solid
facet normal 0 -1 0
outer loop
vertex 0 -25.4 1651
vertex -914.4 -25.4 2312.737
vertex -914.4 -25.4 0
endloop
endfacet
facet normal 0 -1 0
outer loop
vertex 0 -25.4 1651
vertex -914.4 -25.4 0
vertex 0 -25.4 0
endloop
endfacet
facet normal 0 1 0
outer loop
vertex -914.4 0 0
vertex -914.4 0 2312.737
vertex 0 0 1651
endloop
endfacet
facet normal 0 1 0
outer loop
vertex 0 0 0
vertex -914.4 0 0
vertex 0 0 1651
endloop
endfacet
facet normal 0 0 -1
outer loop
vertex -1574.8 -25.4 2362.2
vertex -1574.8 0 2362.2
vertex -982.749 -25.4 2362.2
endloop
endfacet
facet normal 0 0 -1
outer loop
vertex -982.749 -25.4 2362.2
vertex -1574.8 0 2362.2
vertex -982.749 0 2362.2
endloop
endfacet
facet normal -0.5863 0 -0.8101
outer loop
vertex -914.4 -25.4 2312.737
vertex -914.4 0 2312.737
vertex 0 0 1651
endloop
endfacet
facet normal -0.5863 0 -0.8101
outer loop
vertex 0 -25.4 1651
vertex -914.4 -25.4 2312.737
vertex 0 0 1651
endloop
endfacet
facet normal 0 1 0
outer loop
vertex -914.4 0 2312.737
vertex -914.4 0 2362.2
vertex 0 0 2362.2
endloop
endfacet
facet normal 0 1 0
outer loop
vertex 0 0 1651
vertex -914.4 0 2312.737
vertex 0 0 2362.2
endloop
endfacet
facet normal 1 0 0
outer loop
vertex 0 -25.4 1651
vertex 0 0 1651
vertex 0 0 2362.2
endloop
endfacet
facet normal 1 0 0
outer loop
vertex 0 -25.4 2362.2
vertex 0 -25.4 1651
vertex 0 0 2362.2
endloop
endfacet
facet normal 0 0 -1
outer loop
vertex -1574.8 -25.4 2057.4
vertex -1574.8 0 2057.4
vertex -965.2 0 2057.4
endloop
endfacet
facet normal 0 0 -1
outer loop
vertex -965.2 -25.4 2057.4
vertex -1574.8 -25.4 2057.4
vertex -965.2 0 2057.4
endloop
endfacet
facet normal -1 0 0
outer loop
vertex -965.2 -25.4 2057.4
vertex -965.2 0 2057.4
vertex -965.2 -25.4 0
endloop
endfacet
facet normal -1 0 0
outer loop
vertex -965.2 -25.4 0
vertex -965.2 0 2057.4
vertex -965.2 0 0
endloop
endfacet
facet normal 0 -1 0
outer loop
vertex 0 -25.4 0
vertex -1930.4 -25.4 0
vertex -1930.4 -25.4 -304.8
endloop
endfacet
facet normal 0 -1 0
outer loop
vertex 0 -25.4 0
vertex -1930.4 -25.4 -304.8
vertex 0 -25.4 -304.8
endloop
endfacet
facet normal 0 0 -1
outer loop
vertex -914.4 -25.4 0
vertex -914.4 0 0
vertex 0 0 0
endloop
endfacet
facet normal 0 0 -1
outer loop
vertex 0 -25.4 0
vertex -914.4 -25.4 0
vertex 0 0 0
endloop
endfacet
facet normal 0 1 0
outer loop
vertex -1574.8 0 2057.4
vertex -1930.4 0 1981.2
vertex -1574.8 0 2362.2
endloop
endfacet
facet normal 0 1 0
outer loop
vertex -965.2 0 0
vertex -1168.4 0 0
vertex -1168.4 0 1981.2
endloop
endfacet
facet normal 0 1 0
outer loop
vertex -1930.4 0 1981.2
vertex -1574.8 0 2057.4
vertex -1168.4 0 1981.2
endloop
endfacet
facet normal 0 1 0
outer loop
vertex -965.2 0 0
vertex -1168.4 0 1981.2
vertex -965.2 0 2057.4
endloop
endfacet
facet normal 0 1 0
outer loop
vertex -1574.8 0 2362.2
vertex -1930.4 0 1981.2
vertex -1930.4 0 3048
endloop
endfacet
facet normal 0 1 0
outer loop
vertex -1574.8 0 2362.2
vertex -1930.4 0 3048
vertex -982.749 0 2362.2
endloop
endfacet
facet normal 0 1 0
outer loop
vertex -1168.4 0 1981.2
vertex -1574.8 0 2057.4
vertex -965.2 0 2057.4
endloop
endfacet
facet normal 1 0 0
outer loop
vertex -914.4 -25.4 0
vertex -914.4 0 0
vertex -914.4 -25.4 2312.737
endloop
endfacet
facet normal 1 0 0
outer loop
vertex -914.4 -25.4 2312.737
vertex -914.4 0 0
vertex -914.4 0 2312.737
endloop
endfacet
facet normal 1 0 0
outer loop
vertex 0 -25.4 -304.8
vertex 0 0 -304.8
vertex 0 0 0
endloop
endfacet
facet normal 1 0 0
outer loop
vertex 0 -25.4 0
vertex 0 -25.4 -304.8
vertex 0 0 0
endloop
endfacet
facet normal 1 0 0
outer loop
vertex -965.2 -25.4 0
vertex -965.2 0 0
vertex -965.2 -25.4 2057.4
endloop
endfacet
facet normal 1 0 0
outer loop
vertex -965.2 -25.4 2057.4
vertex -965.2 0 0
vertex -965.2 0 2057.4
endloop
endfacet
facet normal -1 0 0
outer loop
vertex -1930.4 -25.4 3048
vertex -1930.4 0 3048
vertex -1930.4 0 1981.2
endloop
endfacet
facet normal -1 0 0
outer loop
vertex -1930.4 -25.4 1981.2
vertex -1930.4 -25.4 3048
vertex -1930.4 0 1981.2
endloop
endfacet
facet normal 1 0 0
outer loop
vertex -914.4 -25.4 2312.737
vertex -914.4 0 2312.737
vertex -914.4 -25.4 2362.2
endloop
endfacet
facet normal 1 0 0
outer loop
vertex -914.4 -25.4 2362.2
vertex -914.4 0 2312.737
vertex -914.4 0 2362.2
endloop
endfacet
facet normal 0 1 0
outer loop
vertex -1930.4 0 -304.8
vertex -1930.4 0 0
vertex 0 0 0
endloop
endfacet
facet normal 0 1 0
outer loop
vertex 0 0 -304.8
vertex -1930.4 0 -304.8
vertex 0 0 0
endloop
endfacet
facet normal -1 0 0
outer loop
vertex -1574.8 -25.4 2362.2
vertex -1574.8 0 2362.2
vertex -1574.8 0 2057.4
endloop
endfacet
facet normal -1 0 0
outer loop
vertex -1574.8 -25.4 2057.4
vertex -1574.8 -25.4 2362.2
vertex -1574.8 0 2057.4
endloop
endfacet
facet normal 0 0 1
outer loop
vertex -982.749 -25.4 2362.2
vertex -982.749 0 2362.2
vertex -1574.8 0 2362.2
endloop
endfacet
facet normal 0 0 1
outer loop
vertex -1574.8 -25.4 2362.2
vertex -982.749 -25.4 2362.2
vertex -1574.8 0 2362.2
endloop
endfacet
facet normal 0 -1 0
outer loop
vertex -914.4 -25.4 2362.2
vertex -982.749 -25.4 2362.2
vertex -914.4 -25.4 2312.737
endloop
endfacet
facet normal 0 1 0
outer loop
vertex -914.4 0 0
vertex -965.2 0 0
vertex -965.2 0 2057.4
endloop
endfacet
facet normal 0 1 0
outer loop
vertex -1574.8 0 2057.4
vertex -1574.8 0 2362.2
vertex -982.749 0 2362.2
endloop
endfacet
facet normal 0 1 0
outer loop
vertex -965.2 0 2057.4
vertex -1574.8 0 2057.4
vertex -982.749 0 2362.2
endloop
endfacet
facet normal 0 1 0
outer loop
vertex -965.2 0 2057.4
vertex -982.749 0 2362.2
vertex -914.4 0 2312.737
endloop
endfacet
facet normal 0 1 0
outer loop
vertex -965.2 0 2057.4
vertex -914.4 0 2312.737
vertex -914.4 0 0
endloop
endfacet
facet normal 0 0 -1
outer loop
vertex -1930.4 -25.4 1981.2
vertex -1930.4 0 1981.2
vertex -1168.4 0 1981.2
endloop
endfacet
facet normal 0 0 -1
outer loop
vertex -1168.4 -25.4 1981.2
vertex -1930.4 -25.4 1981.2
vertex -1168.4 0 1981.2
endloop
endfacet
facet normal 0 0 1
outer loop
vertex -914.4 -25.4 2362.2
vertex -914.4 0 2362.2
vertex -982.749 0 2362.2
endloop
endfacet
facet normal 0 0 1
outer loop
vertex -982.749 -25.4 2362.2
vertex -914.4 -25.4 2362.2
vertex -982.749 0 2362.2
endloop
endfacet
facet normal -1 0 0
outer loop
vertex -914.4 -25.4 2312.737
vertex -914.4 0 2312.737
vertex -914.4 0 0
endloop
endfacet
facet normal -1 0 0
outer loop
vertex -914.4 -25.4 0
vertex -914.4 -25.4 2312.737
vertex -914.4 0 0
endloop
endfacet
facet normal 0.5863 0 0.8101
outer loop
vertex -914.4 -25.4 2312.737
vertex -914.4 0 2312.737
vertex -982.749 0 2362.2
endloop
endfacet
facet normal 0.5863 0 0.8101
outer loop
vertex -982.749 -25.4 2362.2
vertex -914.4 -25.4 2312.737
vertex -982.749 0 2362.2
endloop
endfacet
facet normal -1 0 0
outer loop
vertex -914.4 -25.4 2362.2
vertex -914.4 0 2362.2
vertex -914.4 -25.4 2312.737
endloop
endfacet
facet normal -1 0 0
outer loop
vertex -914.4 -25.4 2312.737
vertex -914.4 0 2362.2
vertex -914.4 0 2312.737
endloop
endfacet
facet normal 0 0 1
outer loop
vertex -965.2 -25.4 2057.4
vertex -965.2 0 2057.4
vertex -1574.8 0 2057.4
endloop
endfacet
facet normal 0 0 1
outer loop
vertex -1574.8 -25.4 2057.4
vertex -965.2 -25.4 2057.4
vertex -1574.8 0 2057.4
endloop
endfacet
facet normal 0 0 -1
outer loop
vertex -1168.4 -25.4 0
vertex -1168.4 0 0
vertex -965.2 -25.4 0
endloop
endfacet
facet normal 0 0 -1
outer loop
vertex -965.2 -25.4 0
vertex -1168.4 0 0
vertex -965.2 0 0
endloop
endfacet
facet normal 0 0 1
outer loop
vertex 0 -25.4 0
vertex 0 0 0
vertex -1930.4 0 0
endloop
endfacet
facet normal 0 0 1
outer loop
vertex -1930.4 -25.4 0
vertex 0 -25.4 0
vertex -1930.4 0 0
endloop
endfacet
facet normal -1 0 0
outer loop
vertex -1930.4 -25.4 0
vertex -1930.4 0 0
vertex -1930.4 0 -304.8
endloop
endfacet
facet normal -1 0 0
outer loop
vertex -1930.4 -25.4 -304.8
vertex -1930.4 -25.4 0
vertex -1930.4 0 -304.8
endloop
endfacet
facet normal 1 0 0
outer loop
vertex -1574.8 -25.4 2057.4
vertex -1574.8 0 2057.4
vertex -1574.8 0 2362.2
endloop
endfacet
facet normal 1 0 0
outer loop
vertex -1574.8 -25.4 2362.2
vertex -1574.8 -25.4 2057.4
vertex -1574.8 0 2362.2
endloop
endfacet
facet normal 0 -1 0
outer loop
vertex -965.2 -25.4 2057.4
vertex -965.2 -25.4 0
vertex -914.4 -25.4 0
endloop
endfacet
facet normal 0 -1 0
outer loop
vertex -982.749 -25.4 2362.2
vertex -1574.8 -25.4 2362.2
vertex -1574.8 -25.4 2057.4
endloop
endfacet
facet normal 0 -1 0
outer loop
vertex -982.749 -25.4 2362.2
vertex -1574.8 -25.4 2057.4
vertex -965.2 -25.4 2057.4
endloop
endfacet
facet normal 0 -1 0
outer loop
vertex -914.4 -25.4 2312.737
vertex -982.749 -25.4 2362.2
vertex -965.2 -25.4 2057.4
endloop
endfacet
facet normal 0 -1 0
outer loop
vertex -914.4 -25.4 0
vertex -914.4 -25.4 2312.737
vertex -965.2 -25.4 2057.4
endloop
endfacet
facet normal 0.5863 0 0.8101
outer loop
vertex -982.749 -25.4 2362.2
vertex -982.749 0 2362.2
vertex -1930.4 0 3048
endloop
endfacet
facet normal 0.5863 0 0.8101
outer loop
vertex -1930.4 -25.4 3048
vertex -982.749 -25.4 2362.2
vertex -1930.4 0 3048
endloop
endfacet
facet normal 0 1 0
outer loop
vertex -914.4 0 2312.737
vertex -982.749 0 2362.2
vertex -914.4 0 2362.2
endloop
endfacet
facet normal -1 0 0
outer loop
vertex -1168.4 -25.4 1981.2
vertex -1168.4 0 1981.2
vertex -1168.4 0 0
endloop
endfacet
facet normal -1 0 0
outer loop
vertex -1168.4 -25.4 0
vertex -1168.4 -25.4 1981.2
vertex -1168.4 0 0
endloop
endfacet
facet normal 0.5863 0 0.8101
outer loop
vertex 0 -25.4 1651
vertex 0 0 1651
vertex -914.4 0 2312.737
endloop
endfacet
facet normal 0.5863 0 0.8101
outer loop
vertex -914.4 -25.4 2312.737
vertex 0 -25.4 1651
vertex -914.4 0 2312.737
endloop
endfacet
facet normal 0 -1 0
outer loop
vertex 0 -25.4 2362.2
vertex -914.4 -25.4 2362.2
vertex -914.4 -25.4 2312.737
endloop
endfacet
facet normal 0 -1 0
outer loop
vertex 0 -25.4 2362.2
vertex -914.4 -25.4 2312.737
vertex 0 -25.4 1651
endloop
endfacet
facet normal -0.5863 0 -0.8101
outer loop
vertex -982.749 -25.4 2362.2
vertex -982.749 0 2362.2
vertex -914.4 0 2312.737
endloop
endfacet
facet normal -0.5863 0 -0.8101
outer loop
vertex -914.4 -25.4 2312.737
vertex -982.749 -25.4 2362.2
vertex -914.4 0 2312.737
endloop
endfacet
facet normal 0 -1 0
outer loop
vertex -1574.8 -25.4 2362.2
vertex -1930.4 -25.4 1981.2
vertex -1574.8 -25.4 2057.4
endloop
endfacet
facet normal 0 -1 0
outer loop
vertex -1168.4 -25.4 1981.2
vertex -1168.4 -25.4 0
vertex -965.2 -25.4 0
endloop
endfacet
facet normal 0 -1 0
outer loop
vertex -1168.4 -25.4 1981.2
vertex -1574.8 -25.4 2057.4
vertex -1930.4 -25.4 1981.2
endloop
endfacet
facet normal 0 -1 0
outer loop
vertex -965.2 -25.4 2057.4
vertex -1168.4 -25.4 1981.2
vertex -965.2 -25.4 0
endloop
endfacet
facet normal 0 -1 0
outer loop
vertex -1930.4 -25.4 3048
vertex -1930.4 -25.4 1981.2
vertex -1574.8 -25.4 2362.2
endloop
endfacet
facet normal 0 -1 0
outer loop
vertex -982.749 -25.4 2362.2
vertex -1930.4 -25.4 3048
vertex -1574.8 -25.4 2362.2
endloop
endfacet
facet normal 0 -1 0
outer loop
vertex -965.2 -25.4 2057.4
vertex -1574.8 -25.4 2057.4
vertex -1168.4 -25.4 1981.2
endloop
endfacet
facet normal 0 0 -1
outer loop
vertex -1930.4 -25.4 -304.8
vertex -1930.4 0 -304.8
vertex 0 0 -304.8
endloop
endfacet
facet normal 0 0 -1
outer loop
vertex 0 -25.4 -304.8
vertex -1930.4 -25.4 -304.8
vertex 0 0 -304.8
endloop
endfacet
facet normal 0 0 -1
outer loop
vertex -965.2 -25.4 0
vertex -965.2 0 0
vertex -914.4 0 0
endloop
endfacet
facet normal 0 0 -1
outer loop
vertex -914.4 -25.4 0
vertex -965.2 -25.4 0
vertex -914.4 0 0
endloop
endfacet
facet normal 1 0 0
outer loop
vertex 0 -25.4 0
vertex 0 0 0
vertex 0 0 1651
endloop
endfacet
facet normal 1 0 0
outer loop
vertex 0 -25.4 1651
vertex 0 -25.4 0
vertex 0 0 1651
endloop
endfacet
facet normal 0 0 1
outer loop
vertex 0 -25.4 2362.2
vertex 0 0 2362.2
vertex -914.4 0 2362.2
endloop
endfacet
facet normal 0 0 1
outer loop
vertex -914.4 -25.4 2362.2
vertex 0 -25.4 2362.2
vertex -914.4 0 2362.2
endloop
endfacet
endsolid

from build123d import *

# Parameters (mm, degrees)
F1_DEPTH = 25.4
F2_DEPTH = 25.4
F3_DEPTH = 25.4


with BuildPart() as f1:
    # F0 (on Front) → F1 (new body)
    with BuildSketch(Plane.XZ):
        Polygon((-965.2, 0), (-914.4, 0), (-914.4, 2312.736842), (-982.749091, 2362.2), (-1574.8, 2362.2), (-1574.8, 2057.4), (-965.2, 2057.4), align=None)
        Polygon((-914.4, 2362.2), (-914.4, 2312.736842), (0, 1651), (0, 2362.2), align=None)
    extrude(amount=F1_DEPTH)


with BuildPart() as f2:
    # F0 (on Front) → F2 (new body)
    with BuildSketch(Plane.XZ):
        Polygon((-1168.4, 0), (-965.2, 0), (-965.2, 2057.4), (-1574.8, 2057.4), (-1574.8, 2362.2), (-982.749091, 2362.2), (-1930.4, 3048), (-1930.4, 1981.2), (-1168.4, 1981.2), align=None)
        Polygon((-982.749091, 2362.2), (-914.4, 2312.736842), (-914.4, 2362.2), align=None)
        Polygon((-914.4, 2312.736842), (-914.4, 0), (0, 0), (0, 1651), align=None)
    extrude(amount=F2_DEPTH)


with BuildPart() as f3:
    # F0 (on Front) → F3 (new body)
    with BuildSketch(Plane.XZ):
        Polygon((0, 0), (-914.4, 0), (-965.2, 0), (-1168.4, 0), (-1930.4, 0), (-1930.4, -304.8), (0, -304.8), align=None)
    extrude(amount=F3_DEPTH)


solid = Compound([f1.part, f2.part, f3.part])
